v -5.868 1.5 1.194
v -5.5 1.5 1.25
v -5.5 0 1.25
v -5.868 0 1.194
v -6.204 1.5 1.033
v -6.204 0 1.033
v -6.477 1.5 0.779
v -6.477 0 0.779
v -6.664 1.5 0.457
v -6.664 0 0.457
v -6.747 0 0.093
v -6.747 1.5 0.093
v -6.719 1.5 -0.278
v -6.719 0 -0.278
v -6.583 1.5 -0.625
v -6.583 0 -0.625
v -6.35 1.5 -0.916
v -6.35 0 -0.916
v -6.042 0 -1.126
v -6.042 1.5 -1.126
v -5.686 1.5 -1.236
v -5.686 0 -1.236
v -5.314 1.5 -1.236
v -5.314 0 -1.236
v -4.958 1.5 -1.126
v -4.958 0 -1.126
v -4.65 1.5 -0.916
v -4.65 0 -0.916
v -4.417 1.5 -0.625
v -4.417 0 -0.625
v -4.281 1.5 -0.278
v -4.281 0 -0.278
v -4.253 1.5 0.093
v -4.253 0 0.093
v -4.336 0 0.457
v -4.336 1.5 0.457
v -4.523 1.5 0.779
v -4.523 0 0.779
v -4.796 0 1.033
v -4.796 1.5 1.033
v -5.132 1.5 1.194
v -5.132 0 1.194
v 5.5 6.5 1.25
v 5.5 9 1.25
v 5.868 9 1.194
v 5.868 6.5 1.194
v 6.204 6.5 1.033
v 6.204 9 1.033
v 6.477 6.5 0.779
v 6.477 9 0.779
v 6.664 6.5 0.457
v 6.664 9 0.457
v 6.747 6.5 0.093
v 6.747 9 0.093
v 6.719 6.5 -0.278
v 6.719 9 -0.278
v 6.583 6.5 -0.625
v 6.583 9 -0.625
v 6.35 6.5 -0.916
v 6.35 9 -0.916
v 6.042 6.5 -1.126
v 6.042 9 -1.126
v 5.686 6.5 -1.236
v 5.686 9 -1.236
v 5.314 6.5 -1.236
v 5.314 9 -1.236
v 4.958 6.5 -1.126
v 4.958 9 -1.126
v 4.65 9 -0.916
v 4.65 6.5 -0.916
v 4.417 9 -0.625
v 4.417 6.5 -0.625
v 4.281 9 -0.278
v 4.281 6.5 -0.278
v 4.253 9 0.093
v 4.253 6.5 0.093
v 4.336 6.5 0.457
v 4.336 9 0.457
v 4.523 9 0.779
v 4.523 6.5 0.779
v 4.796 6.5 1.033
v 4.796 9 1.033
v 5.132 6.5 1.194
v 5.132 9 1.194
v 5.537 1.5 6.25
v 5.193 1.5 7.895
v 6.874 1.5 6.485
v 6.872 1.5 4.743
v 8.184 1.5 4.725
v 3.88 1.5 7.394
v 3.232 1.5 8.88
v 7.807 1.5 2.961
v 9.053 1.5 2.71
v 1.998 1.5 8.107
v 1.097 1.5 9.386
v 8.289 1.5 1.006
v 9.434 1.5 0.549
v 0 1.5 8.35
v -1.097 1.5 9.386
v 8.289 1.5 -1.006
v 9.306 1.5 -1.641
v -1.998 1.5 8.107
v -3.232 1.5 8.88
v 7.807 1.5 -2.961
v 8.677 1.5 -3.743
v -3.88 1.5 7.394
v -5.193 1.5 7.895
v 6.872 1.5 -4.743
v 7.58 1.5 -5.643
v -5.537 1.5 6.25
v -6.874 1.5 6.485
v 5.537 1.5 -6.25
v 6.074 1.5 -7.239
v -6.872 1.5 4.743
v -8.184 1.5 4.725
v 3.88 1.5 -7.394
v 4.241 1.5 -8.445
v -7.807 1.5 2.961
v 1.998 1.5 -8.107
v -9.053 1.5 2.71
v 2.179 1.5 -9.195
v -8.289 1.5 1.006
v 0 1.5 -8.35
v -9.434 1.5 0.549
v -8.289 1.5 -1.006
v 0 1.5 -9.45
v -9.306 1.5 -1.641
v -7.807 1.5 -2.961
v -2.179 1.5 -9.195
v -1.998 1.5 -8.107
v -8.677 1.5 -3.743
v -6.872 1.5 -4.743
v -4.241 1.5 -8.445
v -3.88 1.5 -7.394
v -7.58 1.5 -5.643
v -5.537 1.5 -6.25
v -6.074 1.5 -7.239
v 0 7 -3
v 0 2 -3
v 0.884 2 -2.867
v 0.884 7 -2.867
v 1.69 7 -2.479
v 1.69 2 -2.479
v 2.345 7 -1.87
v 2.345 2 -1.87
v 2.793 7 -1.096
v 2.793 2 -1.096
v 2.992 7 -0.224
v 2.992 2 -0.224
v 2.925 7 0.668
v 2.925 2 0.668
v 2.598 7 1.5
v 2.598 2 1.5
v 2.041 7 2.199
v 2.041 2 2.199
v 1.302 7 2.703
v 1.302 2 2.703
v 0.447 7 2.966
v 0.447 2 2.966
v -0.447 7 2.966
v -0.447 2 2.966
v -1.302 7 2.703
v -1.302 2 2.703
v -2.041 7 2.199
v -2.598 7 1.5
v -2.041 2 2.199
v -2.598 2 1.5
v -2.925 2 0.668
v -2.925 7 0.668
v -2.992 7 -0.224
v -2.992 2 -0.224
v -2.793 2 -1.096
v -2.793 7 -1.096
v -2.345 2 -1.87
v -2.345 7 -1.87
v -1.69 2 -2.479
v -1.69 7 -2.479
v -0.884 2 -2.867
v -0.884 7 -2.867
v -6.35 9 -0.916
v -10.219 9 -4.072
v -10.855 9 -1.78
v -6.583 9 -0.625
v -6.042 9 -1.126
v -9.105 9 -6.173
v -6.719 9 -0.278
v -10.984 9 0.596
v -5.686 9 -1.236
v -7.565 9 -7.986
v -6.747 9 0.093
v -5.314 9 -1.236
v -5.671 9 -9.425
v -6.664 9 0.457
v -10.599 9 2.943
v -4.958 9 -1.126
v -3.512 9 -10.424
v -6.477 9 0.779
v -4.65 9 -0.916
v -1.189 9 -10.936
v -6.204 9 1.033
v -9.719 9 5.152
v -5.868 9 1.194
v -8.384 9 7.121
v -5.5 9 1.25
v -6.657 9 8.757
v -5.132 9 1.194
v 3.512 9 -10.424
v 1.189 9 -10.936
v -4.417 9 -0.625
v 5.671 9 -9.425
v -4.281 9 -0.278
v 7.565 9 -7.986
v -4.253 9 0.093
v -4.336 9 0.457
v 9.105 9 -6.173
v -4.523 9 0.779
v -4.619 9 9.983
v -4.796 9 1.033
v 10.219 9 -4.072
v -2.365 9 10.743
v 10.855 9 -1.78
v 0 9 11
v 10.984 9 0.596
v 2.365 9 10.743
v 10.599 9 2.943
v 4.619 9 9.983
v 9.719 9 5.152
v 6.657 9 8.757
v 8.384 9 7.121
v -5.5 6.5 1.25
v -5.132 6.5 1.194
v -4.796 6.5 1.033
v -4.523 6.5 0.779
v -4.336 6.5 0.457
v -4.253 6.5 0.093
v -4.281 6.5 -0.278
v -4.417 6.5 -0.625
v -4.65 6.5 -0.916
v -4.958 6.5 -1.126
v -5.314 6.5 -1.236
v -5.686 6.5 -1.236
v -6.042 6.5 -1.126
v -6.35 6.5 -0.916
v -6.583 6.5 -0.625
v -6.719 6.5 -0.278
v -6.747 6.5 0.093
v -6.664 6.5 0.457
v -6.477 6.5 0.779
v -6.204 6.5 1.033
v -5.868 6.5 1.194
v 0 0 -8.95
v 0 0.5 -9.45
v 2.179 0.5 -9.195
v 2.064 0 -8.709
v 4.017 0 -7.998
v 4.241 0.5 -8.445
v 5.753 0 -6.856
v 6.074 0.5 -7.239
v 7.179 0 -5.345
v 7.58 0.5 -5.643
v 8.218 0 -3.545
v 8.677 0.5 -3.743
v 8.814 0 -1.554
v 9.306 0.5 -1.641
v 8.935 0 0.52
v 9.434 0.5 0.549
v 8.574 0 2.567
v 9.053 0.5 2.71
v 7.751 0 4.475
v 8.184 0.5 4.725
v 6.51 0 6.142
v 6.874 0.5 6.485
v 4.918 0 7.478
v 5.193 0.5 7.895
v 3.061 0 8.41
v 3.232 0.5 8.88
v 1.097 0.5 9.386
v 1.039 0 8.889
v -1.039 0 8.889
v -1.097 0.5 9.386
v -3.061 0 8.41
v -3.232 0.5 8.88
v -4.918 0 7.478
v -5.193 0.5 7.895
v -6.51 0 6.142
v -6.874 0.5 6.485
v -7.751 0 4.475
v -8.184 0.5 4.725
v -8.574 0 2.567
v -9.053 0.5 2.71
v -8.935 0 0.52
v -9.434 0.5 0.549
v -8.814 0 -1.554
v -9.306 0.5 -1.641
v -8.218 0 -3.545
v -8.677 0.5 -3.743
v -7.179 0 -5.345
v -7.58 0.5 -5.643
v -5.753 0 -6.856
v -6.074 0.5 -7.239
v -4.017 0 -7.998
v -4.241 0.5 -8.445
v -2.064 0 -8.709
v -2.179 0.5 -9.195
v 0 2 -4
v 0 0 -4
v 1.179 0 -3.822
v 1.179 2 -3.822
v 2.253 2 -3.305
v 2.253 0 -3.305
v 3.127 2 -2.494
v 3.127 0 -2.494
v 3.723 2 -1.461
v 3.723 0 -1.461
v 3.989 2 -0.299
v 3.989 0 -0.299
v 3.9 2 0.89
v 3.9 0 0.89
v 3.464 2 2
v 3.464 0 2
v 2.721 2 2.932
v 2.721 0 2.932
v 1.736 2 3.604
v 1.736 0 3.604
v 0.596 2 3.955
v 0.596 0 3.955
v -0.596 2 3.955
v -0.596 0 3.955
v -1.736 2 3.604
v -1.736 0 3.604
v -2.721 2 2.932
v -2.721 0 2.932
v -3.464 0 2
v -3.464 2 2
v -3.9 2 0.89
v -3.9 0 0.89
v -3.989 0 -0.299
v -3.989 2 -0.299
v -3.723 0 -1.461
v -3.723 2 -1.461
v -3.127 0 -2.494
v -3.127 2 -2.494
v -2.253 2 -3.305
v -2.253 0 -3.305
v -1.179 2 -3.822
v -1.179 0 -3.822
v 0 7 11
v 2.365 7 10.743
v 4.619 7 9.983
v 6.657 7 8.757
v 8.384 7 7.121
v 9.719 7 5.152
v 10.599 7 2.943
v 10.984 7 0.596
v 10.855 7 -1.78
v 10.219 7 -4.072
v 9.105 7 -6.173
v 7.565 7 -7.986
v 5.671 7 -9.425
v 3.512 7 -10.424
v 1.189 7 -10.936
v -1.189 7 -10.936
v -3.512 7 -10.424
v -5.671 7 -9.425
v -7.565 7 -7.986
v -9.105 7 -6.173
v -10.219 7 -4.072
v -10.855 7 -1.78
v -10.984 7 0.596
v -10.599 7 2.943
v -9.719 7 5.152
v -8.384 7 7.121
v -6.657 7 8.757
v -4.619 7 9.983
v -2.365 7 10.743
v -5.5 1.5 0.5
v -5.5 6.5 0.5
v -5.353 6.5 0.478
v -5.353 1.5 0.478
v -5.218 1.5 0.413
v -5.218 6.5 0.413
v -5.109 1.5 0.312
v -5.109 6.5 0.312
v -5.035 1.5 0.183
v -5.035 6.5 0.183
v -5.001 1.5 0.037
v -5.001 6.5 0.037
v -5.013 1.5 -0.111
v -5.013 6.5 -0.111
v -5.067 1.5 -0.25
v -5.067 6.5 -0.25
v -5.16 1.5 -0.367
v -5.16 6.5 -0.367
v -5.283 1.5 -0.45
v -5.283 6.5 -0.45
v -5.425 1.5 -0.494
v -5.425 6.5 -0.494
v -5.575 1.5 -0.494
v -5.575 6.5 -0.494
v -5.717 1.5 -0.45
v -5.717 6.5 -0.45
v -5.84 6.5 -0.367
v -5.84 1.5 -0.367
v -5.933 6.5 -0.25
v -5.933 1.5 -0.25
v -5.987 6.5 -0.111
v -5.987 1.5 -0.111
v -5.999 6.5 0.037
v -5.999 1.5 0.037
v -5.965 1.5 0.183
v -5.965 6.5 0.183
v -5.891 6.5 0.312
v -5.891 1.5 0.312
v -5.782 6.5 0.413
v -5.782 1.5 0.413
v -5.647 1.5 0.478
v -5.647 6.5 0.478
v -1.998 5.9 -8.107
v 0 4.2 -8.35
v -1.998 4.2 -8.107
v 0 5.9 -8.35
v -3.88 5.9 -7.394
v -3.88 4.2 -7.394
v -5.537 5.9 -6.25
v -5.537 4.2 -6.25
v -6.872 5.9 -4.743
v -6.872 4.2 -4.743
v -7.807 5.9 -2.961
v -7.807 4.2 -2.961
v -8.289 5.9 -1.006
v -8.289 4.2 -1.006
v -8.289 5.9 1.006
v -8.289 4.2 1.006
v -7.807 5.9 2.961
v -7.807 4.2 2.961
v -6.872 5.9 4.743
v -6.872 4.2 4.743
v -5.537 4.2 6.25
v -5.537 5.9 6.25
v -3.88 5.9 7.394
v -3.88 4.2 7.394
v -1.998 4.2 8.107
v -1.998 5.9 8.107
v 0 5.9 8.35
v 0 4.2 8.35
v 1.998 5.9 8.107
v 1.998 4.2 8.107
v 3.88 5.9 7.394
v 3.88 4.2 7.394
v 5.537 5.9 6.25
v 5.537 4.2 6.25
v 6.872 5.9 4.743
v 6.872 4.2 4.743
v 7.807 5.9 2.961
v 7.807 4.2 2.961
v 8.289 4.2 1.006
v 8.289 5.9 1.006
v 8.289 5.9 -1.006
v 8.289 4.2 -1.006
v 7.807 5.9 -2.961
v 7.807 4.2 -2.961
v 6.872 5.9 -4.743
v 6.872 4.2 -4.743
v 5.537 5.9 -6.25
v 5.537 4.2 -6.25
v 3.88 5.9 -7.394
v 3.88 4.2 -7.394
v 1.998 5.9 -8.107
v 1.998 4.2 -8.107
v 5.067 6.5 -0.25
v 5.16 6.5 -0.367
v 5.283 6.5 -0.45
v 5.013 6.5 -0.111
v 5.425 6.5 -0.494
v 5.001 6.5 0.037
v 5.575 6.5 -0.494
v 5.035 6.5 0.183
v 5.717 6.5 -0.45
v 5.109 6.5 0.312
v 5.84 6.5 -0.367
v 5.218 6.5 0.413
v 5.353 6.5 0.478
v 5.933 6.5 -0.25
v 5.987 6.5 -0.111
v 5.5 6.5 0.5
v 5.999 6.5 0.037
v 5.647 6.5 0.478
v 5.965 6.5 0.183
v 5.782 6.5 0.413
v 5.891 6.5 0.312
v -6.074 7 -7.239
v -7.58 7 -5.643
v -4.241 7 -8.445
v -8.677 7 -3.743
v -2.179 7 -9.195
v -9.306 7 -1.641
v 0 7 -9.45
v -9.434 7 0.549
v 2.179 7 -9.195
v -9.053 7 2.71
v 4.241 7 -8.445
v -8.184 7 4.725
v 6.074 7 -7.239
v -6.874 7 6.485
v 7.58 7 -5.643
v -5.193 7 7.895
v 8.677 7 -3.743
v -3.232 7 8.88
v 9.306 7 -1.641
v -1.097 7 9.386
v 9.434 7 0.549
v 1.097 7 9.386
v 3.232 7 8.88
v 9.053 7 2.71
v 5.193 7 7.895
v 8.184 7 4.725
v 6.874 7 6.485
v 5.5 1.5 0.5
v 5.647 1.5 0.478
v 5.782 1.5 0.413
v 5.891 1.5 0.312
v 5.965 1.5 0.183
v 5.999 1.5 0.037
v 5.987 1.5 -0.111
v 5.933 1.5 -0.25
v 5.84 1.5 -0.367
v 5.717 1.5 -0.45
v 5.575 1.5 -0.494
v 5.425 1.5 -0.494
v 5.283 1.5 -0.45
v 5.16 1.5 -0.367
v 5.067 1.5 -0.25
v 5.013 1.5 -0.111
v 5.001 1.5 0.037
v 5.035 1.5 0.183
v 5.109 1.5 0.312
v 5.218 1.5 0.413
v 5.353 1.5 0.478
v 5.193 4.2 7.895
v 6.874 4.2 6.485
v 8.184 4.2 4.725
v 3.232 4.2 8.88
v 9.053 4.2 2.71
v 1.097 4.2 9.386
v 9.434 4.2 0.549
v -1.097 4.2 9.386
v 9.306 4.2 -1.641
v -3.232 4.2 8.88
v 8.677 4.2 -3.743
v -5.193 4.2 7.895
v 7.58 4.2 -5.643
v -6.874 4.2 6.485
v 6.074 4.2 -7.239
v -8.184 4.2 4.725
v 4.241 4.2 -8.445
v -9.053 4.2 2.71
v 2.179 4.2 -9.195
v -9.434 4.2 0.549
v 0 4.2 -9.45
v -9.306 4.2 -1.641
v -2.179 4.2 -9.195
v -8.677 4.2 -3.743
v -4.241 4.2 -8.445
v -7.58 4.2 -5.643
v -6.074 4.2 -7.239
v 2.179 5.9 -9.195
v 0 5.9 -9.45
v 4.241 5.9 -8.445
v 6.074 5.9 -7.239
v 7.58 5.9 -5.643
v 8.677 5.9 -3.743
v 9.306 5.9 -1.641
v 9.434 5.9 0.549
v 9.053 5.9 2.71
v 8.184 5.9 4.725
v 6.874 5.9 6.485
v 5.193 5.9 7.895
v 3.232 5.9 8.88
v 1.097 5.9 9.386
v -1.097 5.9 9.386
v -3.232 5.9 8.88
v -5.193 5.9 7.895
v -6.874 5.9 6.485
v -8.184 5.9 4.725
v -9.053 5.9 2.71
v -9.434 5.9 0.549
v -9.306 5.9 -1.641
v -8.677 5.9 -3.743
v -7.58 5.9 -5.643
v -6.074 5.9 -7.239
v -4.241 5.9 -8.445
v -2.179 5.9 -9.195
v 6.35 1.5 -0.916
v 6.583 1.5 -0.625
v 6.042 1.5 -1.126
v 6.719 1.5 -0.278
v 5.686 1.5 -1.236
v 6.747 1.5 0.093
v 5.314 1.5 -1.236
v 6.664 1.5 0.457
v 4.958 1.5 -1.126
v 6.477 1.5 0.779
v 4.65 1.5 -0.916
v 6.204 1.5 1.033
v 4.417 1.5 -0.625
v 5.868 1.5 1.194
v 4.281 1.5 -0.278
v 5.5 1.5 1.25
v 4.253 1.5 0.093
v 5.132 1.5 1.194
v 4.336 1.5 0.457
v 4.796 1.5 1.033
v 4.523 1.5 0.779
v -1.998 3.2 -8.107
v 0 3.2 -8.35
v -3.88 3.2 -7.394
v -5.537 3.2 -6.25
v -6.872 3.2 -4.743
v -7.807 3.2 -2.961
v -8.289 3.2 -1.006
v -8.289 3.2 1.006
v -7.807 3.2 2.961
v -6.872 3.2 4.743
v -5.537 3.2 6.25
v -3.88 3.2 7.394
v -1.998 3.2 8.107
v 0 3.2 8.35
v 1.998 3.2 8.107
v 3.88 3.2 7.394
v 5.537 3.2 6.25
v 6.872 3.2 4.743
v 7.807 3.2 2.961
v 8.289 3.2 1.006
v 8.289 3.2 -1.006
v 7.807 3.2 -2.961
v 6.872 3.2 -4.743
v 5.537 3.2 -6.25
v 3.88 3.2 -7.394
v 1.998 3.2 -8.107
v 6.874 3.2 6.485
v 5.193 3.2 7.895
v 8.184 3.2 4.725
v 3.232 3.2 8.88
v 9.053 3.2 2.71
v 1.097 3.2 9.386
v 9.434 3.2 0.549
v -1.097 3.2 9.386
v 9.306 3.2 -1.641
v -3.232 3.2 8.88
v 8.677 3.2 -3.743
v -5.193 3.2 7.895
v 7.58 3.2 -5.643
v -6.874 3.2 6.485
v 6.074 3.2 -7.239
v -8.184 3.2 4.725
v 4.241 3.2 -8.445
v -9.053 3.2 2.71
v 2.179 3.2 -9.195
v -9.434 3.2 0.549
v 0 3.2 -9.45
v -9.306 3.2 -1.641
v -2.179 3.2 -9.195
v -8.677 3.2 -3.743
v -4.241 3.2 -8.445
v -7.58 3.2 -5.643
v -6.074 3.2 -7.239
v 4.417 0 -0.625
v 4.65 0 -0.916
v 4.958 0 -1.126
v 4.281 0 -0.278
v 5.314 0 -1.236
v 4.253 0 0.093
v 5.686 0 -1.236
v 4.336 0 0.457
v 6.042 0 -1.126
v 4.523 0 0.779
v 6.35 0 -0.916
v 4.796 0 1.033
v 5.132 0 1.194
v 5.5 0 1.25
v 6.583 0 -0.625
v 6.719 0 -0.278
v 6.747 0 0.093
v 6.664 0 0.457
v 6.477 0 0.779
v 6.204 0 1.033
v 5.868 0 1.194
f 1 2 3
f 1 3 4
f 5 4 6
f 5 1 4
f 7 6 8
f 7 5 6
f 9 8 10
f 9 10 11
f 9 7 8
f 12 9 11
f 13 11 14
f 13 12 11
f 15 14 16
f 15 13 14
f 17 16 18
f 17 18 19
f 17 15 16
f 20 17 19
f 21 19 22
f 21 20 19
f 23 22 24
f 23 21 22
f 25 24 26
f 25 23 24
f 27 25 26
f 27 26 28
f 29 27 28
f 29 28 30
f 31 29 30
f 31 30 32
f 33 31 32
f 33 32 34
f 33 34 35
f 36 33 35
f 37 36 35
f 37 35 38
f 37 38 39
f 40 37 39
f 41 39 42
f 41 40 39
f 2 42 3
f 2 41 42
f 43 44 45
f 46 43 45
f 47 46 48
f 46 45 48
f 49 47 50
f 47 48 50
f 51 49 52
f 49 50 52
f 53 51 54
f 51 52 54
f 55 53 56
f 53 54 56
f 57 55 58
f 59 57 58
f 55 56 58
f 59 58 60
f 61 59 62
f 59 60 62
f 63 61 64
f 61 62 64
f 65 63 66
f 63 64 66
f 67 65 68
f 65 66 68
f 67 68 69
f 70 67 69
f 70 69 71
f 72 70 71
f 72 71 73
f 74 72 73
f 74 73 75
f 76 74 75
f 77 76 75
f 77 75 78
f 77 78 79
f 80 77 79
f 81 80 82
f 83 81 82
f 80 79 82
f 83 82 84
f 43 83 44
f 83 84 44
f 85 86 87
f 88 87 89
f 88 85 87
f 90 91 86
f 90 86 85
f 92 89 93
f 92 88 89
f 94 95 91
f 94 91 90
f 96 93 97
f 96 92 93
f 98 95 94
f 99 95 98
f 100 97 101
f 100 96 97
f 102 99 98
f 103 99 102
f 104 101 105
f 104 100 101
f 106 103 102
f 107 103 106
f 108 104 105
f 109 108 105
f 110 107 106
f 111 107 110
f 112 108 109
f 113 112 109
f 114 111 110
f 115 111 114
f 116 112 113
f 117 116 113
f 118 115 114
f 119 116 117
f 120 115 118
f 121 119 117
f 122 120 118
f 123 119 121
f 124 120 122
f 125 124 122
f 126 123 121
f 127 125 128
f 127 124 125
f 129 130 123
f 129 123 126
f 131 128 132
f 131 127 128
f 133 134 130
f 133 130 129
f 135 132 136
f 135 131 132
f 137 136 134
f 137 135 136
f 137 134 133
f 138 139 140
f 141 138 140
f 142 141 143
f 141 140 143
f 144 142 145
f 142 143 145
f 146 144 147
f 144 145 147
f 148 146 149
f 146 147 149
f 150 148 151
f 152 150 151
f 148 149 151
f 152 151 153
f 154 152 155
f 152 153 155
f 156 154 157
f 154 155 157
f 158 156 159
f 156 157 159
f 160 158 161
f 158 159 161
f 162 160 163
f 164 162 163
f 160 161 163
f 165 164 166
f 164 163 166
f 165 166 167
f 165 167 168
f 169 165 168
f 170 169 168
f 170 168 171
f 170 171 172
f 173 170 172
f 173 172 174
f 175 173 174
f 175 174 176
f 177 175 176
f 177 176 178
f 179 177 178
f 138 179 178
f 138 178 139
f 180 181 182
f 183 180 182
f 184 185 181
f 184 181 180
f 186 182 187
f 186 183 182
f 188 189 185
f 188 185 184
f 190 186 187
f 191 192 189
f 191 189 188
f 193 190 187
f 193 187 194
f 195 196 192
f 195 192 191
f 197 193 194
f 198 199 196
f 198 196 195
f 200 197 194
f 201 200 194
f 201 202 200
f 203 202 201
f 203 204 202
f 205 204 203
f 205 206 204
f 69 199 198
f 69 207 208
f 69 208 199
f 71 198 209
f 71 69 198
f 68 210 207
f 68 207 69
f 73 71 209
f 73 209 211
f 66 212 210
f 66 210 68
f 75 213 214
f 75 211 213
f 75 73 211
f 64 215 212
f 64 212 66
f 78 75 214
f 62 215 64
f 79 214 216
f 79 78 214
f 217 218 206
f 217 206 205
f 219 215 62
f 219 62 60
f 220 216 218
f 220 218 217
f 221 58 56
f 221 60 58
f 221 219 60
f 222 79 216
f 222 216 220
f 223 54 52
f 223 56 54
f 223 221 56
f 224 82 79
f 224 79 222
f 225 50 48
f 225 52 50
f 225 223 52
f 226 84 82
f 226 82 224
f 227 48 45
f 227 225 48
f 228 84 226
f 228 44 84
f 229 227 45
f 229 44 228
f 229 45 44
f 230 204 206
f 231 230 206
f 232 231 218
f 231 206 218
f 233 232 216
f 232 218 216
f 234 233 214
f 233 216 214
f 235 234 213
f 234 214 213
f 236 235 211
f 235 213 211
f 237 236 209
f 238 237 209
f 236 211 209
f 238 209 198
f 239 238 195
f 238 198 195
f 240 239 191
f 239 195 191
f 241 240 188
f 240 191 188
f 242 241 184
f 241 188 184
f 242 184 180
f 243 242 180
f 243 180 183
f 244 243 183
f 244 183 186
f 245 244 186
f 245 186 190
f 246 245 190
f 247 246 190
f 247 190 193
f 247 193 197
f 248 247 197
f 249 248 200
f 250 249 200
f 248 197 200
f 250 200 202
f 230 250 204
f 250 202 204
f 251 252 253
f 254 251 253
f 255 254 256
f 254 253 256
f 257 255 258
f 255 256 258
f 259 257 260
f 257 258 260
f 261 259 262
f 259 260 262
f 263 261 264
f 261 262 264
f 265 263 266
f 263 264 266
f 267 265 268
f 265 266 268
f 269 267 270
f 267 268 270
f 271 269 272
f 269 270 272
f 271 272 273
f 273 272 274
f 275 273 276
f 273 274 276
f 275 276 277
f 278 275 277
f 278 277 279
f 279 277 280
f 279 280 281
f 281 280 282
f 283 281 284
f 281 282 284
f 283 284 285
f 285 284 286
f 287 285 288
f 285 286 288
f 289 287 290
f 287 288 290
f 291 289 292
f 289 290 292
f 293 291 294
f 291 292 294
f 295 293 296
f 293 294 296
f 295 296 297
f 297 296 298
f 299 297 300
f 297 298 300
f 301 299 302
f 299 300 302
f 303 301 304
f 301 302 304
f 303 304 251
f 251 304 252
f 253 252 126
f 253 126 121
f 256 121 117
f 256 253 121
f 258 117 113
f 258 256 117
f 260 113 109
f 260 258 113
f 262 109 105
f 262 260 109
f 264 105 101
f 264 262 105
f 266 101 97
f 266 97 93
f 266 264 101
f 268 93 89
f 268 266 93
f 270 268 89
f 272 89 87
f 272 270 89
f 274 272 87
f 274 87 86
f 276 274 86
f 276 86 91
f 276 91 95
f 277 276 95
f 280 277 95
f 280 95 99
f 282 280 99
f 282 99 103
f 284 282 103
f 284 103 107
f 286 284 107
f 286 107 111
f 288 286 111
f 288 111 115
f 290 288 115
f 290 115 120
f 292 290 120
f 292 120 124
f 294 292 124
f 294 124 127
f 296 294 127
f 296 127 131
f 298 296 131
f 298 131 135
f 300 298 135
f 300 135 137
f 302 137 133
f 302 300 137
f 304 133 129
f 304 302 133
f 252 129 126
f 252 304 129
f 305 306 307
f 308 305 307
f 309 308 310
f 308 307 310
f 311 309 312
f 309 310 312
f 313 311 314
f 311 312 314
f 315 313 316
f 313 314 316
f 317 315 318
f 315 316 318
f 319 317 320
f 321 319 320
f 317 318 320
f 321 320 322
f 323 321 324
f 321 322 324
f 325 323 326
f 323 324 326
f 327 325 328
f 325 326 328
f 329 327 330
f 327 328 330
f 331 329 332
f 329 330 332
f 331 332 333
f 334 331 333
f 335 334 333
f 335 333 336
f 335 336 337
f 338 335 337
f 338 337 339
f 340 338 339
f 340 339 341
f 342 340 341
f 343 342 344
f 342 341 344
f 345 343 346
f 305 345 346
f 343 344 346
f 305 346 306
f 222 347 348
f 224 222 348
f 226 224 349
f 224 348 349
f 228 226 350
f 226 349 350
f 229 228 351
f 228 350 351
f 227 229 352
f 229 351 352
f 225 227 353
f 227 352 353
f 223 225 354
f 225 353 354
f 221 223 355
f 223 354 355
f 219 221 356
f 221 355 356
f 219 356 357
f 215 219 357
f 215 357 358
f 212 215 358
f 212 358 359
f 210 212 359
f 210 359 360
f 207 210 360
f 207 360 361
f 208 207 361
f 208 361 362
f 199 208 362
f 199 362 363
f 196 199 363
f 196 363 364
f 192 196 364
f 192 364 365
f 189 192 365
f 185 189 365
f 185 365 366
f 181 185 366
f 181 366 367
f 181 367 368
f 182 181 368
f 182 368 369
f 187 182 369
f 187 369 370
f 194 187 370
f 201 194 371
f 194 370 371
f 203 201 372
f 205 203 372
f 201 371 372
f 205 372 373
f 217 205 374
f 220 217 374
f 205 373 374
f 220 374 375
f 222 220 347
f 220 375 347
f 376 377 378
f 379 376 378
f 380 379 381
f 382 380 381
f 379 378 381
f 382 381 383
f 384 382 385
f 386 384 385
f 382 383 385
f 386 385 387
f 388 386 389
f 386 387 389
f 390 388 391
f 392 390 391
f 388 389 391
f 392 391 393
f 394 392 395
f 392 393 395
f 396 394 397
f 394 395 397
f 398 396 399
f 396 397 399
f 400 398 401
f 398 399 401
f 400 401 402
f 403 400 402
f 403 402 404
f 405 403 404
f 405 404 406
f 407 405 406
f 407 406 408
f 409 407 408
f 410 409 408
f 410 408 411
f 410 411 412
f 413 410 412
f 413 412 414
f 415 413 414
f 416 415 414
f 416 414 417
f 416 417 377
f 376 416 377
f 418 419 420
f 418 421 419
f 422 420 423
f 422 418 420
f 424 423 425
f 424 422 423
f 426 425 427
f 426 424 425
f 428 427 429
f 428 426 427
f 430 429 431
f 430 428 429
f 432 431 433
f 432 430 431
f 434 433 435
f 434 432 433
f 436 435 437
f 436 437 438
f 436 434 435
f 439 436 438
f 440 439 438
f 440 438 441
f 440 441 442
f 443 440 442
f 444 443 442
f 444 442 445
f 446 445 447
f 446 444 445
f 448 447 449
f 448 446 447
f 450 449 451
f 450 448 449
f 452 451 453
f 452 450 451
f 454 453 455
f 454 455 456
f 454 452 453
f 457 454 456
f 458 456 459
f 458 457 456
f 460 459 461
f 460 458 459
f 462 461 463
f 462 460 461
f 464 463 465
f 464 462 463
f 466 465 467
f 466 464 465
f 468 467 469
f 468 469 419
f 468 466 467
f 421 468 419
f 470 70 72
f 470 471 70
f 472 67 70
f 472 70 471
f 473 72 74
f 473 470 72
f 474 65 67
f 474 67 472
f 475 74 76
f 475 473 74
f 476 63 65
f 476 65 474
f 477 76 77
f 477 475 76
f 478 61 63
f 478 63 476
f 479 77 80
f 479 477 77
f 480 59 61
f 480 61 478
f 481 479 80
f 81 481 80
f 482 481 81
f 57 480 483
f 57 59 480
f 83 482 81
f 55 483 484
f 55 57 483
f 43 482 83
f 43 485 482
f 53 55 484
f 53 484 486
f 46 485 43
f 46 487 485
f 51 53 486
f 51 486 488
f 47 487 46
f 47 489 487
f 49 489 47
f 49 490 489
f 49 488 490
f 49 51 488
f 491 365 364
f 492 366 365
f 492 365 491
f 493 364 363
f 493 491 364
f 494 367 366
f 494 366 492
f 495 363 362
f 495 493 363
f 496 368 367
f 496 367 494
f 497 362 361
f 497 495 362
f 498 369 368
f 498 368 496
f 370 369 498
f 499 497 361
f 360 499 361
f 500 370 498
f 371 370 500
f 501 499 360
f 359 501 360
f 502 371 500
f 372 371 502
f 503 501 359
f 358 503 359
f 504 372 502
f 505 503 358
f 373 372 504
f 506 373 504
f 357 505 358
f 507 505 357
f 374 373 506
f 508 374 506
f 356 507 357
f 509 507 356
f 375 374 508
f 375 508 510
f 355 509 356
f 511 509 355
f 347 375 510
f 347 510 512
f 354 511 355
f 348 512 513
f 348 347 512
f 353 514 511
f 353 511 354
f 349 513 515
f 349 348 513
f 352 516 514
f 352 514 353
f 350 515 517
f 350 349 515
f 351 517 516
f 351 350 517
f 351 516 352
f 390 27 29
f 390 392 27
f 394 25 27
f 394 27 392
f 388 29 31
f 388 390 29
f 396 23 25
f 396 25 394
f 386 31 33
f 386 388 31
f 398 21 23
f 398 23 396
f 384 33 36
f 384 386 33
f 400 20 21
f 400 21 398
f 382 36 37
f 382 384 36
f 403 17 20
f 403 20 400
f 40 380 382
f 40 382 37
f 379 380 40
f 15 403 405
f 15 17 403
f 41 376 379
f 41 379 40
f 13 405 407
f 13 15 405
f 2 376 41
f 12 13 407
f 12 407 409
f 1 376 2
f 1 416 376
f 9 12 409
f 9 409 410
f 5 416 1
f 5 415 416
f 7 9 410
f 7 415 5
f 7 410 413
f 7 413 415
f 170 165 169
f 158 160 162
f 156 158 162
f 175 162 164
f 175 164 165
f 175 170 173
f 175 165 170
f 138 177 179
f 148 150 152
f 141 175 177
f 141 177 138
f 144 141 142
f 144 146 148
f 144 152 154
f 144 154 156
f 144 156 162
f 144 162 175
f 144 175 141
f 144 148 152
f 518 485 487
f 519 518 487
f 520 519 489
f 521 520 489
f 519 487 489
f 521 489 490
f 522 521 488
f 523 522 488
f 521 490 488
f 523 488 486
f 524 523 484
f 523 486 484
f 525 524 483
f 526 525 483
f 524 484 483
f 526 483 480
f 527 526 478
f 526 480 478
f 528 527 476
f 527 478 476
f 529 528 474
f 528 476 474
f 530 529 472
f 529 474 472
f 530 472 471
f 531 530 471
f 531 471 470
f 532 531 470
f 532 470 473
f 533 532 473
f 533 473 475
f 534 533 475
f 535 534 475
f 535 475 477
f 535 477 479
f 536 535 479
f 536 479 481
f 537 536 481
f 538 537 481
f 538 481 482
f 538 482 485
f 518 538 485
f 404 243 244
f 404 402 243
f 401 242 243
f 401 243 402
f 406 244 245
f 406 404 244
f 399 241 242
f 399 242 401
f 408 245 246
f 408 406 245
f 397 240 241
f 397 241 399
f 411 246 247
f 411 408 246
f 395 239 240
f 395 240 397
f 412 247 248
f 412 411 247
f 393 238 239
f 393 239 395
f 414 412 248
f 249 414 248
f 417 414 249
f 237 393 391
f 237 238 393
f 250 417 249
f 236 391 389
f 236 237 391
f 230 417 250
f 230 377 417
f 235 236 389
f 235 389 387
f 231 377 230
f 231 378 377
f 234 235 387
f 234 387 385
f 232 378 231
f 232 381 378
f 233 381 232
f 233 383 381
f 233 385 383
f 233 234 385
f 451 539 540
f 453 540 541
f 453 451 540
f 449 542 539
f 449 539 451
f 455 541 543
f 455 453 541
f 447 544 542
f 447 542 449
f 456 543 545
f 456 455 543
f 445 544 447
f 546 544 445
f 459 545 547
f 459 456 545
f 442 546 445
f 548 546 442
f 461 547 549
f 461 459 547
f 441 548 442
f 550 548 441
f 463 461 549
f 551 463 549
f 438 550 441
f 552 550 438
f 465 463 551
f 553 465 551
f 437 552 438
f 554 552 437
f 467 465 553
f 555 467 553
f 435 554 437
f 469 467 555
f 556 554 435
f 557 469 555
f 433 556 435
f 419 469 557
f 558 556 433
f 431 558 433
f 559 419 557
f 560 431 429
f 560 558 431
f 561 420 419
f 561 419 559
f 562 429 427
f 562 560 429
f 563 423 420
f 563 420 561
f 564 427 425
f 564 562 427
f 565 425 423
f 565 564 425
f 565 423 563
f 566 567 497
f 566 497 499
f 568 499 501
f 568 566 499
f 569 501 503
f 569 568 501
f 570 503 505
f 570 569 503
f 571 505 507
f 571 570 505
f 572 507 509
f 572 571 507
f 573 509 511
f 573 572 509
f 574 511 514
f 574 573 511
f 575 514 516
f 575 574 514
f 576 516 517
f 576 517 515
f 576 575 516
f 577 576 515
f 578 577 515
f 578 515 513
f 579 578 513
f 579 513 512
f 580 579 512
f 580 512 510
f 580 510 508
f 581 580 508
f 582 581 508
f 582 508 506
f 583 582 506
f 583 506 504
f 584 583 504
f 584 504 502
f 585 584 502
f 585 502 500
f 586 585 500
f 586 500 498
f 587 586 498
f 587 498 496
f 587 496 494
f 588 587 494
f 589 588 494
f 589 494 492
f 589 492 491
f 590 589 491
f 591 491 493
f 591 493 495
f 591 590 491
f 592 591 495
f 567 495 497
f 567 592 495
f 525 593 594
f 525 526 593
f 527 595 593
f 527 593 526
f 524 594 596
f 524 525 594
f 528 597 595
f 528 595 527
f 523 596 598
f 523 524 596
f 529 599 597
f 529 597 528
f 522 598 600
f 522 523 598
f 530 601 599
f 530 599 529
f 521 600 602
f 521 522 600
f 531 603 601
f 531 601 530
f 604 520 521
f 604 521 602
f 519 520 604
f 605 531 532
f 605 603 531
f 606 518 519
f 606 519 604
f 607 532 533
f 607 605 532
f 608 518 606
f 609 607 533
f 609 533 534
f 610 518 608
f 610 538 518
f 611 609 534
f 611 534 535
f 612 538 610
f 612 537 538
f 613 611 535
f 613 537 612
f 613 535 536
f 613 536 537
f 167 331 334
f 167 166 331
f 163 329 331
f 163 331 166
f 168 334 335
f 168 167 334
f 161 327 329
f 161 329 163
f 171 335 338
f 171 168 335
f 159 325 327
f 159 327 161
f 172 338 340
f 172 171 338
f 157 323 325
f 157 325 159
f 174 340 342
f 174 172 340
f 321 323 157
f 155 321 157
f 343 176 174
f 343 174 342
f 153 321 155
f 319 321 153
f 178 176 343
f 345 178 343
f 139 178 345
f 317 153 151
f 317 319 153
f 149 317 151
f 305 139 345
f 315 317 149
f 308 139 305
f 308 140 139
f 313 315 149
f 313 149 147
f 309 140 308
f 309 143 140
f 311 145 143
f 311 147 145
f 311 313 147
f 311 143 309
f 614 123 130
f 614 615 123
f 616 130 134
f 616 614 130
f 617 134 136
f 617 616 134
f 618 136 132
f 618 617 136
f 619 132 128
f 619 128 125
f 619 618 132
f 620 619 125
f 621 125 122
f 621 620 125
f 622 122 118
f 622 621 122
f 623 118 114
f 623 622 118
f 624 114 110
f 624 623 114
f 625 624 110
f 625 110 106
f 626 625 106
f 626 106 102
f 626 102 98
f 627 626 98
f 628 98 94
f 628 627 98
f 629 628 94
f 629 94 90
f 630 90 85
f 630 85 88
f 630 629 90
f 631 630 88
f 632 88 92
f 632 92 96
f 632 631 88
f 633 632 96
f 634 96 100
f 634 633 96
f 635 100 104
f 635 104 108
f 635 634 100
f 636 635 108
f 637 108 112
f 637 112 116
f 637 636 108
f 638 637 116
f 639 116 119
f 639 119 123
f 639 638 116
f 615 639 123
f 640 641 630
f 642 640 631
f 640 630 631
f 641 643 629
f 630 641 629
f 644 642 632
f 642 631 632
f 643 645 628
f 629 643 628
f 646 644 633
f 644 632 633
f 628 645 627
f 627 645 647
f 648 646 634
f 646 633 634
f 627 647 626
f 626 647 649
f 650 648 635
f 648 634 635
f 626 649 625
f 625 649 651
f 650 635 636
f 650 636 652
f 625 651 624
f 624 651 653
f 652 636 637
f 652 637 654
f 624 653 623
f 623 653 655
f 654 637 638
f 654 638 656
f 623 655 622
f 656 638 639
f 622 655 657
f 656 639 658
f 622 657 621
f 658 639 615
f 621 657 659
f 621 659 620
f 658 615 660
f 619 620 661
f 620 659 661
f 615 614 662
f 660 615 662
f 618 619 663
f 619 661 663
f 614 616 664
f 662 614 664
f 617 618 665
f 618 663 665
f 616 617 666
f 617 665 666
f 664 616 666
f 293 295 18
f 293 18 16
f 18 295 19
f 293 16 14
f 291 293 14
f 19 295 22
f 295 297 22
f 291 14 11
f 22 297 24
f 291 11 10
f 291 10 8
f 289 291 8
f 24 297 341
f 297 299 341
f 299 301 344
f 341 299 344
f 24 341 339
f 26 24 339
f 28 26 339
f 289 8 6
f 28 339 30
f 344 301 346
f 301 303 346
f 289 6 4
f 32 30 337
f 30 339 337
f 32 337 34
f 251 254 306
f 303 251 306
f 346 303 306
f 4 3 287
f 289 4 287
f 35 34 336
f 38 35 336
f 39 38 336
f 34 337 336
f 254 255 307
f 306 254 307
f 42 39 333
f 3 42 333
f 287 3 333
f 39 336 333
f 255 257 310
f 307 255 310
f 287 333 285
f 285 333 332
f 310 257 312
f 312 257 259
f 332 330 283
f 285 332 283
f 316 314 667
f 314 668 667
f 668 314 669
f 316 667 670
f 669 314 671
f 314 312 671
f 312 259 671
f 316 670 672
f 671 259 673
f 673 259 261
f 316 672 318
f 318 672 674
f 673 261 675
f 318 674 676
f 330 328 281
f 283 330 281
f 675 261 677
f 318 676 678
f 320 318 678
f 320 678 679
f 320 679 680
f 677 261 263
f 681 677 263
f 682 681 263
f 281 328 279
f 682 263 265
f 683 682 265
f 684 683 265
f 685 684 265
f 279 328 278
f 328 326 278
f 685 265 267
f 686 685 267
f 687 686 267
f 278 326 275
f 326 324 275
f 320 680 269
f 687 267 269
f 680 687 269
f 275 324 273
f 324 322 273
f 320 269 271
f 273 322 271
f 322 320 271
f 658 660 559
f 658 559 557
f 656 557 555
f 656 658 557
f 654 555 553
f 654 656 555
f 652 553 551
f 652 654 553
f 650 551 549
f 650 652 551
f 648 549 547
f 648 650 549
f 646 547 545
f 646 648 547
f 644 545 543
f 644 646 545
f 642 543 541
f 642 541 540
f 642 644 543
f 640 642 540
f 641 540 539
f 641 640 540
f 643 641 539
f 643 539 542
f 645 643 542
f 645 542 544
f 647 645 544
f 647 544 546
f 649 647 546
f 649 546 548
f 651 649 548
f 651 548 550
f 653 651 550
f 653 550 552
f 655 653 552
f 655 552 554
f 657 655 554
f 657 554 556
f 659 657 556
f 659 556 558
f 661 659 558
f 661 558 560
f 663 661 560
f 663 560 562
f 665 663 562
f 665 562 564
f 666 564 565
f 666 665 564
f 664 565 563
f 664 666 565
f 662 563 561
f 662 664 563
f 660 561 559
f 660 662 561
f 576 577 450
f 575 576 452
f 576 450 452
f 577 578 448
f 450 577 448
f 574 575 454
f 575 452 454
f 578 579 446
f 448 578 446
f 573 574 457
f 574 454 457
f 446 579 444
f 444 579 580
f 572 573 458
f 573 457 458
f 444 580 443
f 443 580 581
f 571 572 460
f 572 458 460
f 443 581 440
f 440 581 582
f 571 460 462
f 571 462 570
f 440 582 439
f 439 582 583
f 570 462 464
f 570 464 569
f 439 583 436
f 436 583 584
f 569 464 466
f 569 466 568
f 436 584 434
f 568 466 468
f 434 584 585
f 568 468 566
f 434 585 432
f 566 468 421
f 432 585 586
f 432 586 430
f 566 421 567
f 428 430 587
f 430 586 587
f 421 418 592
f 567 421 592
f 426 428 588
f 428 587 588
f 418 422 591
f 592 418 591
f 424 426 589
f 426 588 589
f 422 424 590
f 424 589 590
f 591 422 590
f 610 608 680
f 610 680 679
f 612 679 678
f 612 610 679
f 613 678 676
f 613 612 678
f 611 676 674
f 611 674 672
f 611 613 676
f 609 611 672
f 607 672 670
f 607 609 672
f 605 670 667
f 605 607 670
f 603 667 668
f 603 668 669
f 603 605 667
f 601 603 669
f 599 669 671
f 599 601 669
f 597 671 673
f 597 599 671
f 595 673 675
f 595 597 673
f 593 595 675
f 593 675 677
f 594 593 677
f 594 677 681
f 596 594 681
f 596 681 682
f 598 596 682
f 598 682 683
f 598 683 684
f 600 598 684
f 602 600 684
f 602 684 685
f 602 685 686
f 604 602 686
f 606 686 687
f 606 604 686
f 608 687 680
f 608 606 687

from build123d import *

# Parameters (mm, degrees)
SKETCH_1_R          = 11
EXTRUDE_1_DEPTH     = 9
SKETCH_2_R          = 0.5
CUT_EXTRUDE_1_DEPTH = 18.972200756
SKETCH_3_R          = 16.549134696
SKETCH_3_R_2        = 9.45
CUT_EXTRUDE_2_DEPTH = 7
SKETCH_4_W          = 2.2
SKETCH_4_H          = 1.7
SKETCH_5_R          = 3
CUT_EXTRUDE_3_DEPTH = 7
SKETCH_7_R          = 1.25
CUT_EXTRUDE_5_DEPTH = 2.5
CUT_EXTRUDE_START   = -1.5
SKETCH_8_R          = 1.25
CUT_EXTRUDE_6_DEPTH = 1.5
SKETCH_9_R          = 4
CUT_EXTRUDE_7_DEPTH = 2
CHAMFER_1_SIZE      = 0.5


with BuildPart() as part:
    # 草图1 → 凸台-拉伸1 (new body)
    with BuildSketch(Plane(origin=(0, 0, 0), x_dir=(1, 0, 0), z_dir=(0, 1, 0))):
        with Locations(Location((0, 0, 0), (0, 0, 270))):
            Circle(SKETCH_1_R)
    extrude(amount=EXTRUDE_1_DEPTH)

    # 草图2 → 切除-拉伸1 (cut, through all)
    with BuildSketch(Plane(origin=(0, 9, 0), x_dir=(1, 0, 0), z_dir=(0, 1, 0))):
        with Locations(Location((-5.5, 0, 0), (0, 0, 270))):
            Circle(SKETCH_2_R)
        with Locations(Location((5.5, 0, 0), (0, 0, 270))):
            Circle(SKETCH_2_R)
    extrude(amount=-CUT_EXTRUDE_1_DEPTH, mode=Mode.SUBTRACT)

    # 草图3 → 切除-拉伸2 (cut)
    with BuildSketch(Plane.XZ):
        Circle(SKETCH_3_R)
        with Locations(Location((0, 0, 0), (0, 0, 270))):
            Circle(SKETCH_3_R_2, mode=Mode.SUBTRACT)
    extrude(amount=-CUT_EXTRUDE_2_DEPTH, mode=Mode.SUBTRACT)

    # 草图4 → 切除-旋转1 (revolve, cut)
    with BuildSketch(Plane.XY, mode=Mode.PRIVATE) as cut_revolve_1_sk:
        with Locations((-9.45, 5.05)):
            Rectangle(SKETCH_4_W, SKETCH_4_H)
        with Locations((-9.45, 2.35)):
            Rectangle(SKETCH_4_W, SKETCH_4_H)
    revolve(cut_revolve_1_sk.sketch.rotate(Axis((0, 0, 0), (0, 1, 0)), 270), axis=Axis((0, 0, 0), (0, 1, 0)), mode=Mode.SUBTRACT)

    # 草图5 → 切除-拉伸3 (cut)
    with BuildSketch(Plane.XZ):
        with Locations(Location((0, 0, 0), (0, 0, 270))):
            Circle(SKETCH_5_R)
    extrude(amount=-CUT_EXTRUDE_3_DEPTH, mode=Mode.SUBTRACT)

    # 草图7 → 切除-拉伸5 (cut)
    with BuildSketch(Plane(origin=(0, 9, 0), x_dir=(1, 0, 0), z_dir=(0, 1, 0))):
        with Locations(Location((-5.5, 0, 0), (0, 0, 270))):
            Circle(SKETCH_7_R)
        with Locations(Location((5.5, 0, 0), (0, 0, 270))):
            Circle(SKETCH_7_R)
    extrude(amount=-CUT_EXTRUDE_5_DEPTH, mode=Mode.SUBTRACT)

    # 草图8 → 切除-拉伸6 (cut)
    with BuildSketch(Plane.XZ.offset(CUT_EXTRUDE_START)):
        with Locations(Location((-5.5, 0, 0), (0, 0, 90))):
            Circle(SKETCH_8_R)
        with Locations(Location((5.5, 0, 0), (0, 0, 90))):
            Circle(SKETCH_8_R)
    extrude(amount=CUT_EXTRUDE_6_DEPTH, mode=Mode.SUBTRACT)

    # 草图9 → 切除-拉伸7 (cut)
    with BuildSketch(Plane.XZ):
        with Locations(Location((0, 0, 0), (0, 0, 270))):
            Circle(SKETCH_9_R)
    extrude(amount=-CUT_EXTRUDE_7_DEPTH, mode=Mode.SUBTRACT)

    # 倒角1
    chamfer_1_edges = [part.edges().sort_by_distance(p)[0] for p in [
        (0, 0, 9.45),
    ]]
    chamfer(chamfer_1_edges, length=CHAMFER_1_SIZE)


solid = part.part
